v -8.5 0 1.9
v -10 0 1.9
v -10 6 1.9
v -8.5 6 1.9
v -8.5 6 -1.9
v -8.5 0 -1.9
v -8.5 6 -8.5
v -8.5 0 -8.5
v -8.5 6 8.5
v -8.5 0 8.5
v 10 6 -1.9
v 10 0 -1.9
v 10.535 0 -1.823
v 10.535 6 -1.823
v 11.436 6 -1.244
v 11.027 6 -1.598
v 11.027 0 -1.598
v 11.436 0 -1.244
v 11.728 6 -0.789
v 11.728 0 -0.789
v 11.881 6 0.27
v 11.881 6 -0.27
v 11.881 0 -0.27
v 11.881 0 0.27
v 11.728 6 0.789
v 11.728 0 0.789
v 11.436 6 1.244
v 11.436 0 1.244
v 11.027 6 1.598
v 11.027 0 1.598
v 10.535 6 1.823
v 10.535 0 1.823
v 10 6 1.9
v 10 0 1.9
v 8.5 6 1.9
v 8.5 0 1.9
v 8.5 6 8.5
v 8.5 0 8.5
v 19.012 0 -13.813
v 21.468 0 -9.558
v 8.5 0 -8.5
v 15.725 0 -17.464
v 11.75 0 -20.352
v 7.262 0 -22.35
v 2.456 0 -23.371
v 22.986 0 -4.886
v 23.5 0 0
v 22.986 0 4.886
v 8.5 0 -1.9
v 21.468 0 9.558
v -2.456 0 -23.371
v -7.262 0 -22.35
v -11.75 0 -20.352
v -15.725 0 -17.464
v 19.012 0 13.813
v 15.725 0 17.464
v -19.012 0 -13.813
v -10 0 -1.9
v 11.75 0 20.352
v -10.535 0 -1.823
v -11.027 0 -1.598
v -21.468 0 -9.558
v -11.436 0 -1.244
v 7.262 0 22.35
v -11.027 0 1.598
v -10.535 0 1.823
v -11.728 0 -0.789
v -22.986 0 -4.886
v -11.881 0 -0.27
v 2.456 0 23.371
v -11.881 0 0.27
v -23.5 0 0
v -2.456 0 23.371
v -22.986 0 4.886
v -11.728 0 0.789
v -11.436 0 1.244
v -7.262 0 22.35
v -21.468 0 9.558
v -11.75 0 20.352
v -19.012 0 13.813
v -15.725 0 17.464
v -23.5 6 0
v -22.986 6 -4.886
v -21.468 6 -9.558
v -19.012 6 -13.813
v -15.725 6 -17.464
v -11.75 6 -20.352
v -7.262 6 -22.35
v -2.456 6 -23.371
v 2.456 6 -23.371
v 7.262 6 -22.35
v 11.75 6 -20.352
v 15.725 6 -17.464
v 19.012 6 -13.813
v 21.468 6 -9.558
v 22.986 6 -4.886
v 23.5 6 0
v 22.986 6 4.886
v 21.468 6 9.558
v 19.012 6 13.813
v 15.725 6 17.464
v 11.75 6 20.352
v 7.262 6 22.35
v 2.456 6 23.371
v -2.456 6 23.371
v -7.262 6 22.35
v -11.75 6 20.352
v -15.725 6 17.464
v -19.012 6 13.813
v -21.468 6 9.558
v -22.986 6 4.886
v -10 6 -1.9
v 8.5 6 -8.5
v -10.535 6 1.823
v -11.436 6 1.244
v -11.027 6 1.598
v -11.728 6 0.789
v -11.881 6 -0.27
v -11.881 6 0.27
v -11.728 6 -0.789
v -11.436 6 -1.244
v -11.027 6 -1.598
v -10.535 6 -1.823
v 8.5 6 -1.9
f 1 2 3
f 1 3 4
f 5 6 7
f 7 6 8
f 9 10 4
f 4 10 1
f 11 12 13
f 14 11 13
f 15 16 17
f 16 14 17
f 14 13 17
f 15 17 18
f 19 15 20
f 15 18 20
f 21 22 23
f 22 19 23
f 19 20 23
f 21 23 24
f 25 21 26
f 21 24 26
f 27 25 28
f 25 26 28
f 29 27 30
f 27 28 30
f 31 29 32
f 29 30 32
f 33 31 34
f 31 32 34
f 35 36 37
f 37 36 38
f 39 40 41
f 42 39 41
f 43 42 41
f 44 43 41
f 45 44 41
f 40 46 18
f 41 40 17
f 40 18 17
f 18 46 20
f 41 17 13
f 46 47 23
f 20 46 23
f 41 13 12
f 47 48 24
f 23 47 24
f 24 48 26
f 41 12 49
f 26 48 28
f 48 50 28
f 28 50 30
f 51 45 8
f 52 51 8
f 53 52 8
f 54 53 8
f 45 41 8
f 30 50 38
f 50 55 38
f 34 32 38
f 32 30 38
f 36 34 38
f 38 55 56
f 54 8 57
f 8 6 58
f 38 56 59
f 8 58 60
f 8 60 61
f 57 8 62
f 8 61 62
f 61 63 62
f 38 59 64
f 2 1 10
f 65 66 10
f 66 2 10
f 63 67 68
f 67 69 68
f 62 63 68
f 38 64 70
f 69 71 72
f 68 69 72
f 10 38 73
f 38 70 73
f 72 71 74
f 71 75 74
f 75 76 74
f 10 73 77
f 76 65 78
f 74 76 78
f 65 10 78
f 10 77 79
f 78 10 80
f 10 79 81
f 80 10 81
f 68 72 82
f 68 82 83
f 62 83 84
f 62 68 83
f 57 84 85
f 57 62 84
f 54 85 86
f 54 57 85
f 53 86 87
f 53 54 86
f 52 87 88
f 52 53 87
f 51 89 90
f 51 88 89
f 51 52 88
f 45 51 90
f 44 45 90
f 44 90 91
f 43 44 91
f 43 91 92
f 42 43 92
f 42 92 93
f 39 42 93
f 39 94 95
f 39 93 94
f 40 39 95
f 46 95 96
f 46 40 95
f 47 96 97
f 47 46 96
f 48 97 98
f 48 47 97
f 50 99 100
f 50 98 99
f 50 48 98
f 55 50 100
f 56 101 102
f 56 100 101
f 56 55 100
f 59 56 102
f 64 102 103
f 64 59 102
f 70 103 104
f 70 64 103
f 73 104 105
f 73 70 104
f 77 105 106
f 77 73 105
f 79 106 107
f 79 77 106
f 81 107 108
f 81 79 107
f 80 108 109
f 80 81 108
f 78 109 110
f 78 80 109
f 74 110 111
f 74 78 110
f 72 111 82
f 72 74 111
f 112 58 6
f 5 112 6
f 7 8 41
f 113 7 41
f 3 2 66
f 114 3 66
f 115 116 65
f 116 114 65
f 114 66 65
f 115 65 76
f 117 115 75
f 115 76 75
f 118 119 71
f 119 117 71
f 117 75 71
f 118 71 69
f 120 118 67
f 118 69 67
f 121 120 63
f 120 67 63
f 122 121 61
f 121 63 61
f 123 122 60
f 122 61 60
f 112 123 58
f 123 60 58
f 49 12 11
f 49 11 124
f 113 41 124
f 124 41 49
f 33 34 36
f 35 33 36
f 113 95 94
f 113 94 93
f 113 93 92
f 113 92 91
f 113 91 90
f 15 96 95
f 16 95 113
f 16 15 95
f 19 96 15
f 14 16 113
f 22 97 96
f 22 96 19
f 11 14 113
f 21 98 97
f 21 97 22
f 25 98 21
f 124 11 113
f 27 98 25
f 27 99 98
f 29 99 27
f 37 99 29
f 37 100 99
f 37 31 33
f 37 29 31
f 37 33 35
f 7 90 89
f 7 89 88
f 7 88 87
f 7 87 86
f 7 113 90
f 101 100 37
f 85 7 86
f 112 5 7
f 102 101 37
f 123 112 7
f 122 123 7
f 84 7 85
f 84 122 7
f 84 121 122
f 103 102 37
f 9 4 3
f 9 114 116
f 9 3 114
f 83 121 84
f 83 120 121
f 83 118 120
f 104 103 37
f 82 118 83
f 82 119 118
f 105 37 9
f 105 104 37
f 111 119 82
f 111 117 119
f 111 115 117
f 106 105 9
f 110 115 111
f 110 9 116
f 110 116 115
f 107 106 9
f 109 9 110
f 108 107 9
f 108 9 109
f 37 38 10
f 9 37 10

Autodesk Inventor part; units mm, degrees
ref_plane "YZ Plane" through (0, 0, 0) normal (1, 0, 0) x (0, 1, 0)
ref_plane "XZ Plane" through (0, 0, 0) normal (0, 1, 0) x (-1, 0, 0)
ref_plane "XY Plane" through (0, 0, 0) normal (0, 0, 1) x (1, 0, 0)
sketch "Эскиз1" plane through (0, 0, 0) normal (0, 1, 0) x (-1, 0, 0)
  line L0 (8.5, -8.5) -> (-8.5, -8.5)
  line L1 (-8.5, -8.5) -> (-8.5, -1.9)
  line L2 (-8.5, 8.5) -> (8.5, 8.5)
  line L3 (8.5, 8.5) -> (8.5, 1.9)
  line L4 (0, 0) -> (0, -10.3494) construction
  line L5 (0, 0) -> (-17.6402, 0) construction
  circle A0 centre (10, 0) radius 0.9 construction
  circle A1 centre (-10, 0) radius 0.9 construction
  arc A2 (10, -1.9) -> (10, 1.9) centre (10, 0) ccw
  line L6 (10, -1.9) -> (8.5, -1.9)
  line L7 (10, 1.9) -> (8.5, 1.9)
  line L8 (8.5, -1.9) -> (8.5, -8.5)
  line L9 (8.5, 1.9) -> (8.5, -1.9) construction
  circle A3 centre (-10, 0) radius 0.9 construction
  arc A4 (-10, 1.9) -> (-10, -1.9) centre (-10, 0) ccw
  line L10 (-10, -1.9) -> (-8.5, -1.9)
  line L11 (-10, 1.9) -> (-8.5, 1.9)
  line L12 (-8.5, -1.9) -> (-8.5, 1.9) construction
  line L13 (-8.5, 1.9) -> (-8.5, 8.5)
  circle A5 centre (0, 0) radius 23.5
  dimension "d0" = 17
  dimension "d1" = 17
  dimension "d2" = 1.8
  dimension "d3" = 20
  dimension "d4" = 3.8
  dimension "d5" = 47
extrude "Выдавливание1" add sketch "Эскиз1" along normal blind 6
sketch "Эскиз2" plane through (0, 0, 0) normal (0, 1, 0) x (-1, 0, 0)
  circle A0 centre (0, 0) radius 23.5 construction
  line L0 (8.5, -1.9) -> (8.5, -8.5) construction
  line L1 (8.5, -8.5) -> (-8.5, -8.5) construction
  line L2 (-8.5, -8.5) -> (-8.5, -1.9) construction
  line L3 (-8.5, -1.9) -> (-10, -1.9) construction
  arc A1 (-10, 1.9) -> (-10, -1.9) centre (-10, 0) ccw construction
  line L4 (-10, 1.9) -> (-8.5, 1.9) construction
  line L5 (-8.5, 1.9) -> (-8.5, 8.5) construction
  line L6 (-8.5, 8.5) -> (8.5, 8.5) construction
  line L7 (8.5, 8.5) -> (8.5, 1.9) construction
  line L8 (8.5, 1.9) -> (10, 1.9) construction
  arc A2 (10, -1.9) -> (10, 1.9) centre (10, 0) ccw construction
  line L9 (10, -1.9) -> (8.5, -1.9) construction
  circle A3 centre (14.713, -5.2) radius 1.4
  line L10 (0, 0) -> (0, -23.5) construction
  circle A4 centre (-14.713, -5.2) radius 1.4
  arc A5 (12.5706, -3.1) -> (16.8554, -3.1) centre (14.713, -5.2) ccw
  arc A6 (-16.8554, -3.1) -> (-12.5706, -3.1) centre (-14.713, -5.2) ccw
  line L11 (14.713, -5.2) -> (14.713, -3.1) construction
  line L12 (16.8554, -3.1) -> (12.5706, -3.1)
  line L13 (-16.8554, -3.1) -> (-12.5706, -3.1)
  dimension "d8" = 2.8
  dimension "d9" = 3.3
  dimension "d10" = 29.426
  dimension "d11" = 6
  dimension "d14" = 2.1
extrude "Выдавливание2" [suppressed]
properties part number "circle_cutout"
